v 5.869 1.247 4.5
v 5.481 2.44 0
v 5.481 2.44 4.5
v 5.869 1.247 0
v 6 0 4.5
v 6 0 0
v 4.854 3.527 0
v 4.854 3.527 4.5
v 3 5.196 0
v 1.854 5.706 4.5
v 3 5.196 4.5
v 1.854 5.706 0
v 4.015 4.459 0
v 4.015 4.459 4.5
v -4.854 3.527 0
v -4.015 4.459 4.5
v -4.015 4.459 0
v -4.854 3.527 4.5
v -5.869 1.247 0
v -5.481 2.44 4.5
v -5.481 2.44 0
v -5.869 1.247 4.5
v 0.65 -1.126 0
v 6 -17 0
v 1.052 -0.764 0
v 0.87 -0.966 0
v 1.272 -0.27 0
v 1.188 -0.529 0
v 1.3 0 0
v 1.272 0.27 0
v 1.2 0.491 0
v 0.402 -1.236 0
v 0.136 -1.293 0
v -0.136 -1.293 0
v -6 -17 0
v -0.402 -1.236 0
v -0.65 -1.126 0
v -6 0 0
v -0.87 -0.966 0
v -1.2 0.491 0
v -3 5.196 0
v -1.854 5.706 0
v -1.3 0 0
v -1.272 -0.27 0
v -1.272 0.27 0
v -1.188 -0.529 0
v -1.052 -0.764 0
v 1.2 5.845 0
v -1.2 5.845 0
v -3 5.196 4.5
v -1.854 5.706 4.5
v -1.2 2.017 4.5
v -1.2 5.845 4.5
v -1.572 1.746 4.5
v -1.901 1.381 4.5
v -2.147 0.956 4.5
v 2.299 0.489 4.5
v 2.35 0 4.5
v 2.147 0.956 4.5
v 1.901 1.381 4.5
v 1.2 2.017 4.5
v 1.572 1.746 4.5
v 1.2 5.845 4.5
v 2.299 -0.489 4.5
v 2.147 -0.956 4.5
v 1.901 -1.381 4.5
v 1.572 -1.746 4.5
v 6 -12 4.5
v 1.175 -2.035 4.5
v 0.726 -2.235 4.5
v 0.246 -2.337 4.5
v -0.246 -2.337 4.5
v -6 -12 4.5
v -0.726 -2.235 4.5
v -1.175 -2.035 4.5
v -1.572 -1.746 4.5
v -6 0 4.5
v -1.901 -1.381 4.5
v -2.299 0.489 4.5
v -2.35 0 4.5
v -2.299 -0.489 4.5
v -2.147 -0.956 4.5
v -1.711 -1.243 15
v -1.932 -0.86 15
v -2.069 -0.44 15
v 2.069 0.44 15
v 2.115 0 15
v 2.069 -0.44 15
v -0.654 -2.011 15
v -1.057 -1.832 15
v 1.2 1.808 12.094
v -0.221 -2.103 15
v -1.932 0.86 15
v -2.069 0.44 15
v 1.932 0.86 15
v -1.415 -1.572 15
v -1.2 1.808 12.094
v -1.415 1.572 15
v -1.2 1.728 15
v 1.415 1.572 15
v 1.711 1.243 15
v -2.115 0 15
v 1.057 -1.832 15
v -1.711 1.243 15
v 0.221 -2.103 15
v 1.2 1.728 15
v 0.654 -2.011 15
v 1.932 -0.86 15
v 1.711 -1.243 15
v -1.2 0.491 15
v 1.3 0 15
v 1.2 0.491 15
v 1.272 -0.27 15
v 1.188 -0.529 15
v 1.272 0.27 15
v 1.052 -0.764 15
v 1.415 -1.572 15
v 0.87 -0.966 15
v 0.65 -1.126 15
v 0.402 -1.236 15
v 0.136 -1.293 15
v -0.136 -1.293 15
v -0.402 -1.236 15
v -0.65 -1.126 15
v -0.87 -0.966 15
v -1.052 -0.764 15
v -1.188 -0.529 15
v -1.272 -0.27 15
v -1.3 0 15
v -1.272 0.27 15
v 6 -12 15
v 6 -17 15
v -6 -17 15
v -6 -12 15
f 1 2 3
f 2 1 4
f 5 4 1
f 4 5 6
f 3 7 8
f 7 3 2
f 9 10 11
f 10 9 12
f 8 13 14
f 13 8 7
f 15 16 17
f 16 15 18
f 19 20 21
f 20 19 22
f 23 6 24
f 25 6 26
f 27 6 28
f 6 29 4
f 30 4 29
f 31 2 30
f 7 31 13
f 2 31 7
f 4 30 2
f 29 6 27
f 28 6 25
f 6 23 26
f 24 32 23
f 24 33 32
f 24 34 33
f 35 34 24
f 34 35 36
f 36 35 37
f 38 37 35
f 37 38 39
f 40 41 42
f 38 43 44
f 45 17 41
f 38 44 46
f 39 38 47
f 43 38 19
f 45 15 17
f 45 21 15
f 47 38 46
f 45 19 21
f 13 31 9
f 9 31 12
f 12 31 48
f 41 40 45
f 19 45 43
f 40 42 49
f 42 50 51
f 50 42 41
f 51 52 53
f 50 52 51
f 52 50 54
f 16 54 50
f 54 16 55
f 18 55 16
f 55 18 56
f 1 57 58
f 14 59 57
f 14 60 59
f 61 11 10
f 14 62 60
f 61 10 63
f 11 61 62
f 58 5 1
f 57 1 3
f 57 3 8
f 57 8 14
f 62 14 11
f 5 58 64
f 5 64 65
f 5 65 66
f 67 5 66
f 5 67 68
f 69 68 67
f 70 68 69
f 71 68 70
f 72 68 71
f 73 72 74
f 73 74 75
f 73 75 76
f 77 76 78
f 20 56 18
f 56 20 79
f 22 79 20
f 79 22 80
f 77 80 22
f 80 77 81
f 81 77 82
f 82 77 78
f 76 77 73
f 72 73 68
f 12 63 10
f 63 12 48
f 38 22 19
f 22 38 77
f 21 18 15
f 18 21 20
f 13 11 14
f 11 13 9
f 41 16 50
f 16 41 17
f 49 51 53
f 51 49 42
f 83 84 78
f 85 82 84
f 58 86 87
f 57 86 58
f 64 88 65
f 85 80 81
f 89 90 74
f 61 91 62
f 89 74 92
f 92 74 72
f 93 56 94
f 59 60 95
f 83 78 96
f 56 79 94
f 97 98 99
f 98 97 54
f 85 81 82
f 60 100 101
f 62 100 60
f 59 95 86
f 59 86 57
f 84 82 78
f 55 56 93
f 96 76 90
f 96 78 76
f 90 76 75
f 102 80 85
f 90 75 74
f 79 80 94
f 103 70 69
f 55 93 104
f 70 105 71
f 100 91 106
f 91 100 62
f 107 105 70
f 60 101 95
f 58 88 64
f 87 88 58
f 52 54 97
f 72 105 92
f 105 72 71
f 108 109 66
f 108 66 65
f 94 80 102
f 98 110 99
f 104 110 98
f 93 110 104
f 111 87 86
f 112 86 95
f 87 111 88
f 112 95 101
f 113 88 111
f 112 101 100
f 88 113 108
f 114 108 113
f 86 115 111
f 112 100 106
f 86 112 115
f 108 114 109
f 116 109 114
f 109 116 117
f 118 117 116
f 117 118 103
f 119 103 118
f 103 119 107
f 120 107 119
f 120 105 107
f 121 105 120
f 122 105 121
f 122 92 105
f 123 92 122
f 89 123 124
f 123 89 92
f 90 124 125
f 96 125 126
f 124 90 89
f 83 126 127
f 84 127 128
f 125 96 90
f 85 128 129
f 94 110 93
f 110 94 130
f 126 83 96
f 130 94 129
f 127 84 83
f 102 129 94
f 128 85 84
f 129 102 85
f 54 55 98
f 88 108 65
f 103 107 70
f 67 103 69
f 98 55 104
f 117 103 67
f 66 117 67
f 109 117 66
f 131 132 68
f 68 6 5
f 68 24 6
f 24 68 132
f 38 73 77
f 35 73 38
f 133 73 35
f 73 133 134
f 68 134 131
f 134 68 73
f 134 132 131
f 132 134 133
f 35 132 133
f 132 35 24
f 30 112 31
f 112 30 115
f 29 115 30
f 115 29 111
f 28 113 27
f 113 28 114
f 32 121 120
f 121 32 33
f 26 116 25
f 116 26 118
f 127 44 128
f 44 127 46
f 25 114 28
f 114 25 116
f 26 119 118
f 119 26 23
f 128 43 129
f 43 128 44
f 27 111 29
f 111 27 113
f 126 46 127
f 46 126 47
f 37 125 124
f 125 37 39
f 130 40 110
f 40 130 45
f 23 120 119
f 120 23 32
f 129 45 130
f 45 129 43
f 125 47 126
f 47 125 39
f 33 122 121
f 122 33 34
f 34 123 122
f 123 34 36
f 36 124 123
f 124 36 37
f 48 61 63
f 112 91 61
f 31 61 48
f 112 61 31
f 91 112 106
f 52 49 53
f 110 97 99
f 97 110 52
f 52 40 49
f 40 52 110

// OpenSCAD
h=15;
hole_w=2.4;
big_cap_w=12;
big_cap_h=4.5;

stopper_length=12;

$fs=0.01;

small_cap_w=4.7;
small_cap_h=h-big_cap_h;

  difference(){
    union(){

      cylinder(d =big_cap_w,h=big_cap_h); //big_cap
      translate([0,0,big_cap_h])cylinder(d1 = small_cap_w,d2=small_cap_w*0.9,h=h-big_cap_h);
      translate([0,-(stopper_length)/2,big_cap_h/2])#cube(size=[big_cap_w,stopper_length,big_cap_h],center=true);
      translate([0,-(stopper_length+5/2),h/2])#cube(size=[big_cap_w,5,h],center=true);

    }
    cylinder(d = hole_w+0.2,h=h+0.1);
    translate([-hole_w/2,0,0])cube([hole_w,10,h+0.1]);
  }
